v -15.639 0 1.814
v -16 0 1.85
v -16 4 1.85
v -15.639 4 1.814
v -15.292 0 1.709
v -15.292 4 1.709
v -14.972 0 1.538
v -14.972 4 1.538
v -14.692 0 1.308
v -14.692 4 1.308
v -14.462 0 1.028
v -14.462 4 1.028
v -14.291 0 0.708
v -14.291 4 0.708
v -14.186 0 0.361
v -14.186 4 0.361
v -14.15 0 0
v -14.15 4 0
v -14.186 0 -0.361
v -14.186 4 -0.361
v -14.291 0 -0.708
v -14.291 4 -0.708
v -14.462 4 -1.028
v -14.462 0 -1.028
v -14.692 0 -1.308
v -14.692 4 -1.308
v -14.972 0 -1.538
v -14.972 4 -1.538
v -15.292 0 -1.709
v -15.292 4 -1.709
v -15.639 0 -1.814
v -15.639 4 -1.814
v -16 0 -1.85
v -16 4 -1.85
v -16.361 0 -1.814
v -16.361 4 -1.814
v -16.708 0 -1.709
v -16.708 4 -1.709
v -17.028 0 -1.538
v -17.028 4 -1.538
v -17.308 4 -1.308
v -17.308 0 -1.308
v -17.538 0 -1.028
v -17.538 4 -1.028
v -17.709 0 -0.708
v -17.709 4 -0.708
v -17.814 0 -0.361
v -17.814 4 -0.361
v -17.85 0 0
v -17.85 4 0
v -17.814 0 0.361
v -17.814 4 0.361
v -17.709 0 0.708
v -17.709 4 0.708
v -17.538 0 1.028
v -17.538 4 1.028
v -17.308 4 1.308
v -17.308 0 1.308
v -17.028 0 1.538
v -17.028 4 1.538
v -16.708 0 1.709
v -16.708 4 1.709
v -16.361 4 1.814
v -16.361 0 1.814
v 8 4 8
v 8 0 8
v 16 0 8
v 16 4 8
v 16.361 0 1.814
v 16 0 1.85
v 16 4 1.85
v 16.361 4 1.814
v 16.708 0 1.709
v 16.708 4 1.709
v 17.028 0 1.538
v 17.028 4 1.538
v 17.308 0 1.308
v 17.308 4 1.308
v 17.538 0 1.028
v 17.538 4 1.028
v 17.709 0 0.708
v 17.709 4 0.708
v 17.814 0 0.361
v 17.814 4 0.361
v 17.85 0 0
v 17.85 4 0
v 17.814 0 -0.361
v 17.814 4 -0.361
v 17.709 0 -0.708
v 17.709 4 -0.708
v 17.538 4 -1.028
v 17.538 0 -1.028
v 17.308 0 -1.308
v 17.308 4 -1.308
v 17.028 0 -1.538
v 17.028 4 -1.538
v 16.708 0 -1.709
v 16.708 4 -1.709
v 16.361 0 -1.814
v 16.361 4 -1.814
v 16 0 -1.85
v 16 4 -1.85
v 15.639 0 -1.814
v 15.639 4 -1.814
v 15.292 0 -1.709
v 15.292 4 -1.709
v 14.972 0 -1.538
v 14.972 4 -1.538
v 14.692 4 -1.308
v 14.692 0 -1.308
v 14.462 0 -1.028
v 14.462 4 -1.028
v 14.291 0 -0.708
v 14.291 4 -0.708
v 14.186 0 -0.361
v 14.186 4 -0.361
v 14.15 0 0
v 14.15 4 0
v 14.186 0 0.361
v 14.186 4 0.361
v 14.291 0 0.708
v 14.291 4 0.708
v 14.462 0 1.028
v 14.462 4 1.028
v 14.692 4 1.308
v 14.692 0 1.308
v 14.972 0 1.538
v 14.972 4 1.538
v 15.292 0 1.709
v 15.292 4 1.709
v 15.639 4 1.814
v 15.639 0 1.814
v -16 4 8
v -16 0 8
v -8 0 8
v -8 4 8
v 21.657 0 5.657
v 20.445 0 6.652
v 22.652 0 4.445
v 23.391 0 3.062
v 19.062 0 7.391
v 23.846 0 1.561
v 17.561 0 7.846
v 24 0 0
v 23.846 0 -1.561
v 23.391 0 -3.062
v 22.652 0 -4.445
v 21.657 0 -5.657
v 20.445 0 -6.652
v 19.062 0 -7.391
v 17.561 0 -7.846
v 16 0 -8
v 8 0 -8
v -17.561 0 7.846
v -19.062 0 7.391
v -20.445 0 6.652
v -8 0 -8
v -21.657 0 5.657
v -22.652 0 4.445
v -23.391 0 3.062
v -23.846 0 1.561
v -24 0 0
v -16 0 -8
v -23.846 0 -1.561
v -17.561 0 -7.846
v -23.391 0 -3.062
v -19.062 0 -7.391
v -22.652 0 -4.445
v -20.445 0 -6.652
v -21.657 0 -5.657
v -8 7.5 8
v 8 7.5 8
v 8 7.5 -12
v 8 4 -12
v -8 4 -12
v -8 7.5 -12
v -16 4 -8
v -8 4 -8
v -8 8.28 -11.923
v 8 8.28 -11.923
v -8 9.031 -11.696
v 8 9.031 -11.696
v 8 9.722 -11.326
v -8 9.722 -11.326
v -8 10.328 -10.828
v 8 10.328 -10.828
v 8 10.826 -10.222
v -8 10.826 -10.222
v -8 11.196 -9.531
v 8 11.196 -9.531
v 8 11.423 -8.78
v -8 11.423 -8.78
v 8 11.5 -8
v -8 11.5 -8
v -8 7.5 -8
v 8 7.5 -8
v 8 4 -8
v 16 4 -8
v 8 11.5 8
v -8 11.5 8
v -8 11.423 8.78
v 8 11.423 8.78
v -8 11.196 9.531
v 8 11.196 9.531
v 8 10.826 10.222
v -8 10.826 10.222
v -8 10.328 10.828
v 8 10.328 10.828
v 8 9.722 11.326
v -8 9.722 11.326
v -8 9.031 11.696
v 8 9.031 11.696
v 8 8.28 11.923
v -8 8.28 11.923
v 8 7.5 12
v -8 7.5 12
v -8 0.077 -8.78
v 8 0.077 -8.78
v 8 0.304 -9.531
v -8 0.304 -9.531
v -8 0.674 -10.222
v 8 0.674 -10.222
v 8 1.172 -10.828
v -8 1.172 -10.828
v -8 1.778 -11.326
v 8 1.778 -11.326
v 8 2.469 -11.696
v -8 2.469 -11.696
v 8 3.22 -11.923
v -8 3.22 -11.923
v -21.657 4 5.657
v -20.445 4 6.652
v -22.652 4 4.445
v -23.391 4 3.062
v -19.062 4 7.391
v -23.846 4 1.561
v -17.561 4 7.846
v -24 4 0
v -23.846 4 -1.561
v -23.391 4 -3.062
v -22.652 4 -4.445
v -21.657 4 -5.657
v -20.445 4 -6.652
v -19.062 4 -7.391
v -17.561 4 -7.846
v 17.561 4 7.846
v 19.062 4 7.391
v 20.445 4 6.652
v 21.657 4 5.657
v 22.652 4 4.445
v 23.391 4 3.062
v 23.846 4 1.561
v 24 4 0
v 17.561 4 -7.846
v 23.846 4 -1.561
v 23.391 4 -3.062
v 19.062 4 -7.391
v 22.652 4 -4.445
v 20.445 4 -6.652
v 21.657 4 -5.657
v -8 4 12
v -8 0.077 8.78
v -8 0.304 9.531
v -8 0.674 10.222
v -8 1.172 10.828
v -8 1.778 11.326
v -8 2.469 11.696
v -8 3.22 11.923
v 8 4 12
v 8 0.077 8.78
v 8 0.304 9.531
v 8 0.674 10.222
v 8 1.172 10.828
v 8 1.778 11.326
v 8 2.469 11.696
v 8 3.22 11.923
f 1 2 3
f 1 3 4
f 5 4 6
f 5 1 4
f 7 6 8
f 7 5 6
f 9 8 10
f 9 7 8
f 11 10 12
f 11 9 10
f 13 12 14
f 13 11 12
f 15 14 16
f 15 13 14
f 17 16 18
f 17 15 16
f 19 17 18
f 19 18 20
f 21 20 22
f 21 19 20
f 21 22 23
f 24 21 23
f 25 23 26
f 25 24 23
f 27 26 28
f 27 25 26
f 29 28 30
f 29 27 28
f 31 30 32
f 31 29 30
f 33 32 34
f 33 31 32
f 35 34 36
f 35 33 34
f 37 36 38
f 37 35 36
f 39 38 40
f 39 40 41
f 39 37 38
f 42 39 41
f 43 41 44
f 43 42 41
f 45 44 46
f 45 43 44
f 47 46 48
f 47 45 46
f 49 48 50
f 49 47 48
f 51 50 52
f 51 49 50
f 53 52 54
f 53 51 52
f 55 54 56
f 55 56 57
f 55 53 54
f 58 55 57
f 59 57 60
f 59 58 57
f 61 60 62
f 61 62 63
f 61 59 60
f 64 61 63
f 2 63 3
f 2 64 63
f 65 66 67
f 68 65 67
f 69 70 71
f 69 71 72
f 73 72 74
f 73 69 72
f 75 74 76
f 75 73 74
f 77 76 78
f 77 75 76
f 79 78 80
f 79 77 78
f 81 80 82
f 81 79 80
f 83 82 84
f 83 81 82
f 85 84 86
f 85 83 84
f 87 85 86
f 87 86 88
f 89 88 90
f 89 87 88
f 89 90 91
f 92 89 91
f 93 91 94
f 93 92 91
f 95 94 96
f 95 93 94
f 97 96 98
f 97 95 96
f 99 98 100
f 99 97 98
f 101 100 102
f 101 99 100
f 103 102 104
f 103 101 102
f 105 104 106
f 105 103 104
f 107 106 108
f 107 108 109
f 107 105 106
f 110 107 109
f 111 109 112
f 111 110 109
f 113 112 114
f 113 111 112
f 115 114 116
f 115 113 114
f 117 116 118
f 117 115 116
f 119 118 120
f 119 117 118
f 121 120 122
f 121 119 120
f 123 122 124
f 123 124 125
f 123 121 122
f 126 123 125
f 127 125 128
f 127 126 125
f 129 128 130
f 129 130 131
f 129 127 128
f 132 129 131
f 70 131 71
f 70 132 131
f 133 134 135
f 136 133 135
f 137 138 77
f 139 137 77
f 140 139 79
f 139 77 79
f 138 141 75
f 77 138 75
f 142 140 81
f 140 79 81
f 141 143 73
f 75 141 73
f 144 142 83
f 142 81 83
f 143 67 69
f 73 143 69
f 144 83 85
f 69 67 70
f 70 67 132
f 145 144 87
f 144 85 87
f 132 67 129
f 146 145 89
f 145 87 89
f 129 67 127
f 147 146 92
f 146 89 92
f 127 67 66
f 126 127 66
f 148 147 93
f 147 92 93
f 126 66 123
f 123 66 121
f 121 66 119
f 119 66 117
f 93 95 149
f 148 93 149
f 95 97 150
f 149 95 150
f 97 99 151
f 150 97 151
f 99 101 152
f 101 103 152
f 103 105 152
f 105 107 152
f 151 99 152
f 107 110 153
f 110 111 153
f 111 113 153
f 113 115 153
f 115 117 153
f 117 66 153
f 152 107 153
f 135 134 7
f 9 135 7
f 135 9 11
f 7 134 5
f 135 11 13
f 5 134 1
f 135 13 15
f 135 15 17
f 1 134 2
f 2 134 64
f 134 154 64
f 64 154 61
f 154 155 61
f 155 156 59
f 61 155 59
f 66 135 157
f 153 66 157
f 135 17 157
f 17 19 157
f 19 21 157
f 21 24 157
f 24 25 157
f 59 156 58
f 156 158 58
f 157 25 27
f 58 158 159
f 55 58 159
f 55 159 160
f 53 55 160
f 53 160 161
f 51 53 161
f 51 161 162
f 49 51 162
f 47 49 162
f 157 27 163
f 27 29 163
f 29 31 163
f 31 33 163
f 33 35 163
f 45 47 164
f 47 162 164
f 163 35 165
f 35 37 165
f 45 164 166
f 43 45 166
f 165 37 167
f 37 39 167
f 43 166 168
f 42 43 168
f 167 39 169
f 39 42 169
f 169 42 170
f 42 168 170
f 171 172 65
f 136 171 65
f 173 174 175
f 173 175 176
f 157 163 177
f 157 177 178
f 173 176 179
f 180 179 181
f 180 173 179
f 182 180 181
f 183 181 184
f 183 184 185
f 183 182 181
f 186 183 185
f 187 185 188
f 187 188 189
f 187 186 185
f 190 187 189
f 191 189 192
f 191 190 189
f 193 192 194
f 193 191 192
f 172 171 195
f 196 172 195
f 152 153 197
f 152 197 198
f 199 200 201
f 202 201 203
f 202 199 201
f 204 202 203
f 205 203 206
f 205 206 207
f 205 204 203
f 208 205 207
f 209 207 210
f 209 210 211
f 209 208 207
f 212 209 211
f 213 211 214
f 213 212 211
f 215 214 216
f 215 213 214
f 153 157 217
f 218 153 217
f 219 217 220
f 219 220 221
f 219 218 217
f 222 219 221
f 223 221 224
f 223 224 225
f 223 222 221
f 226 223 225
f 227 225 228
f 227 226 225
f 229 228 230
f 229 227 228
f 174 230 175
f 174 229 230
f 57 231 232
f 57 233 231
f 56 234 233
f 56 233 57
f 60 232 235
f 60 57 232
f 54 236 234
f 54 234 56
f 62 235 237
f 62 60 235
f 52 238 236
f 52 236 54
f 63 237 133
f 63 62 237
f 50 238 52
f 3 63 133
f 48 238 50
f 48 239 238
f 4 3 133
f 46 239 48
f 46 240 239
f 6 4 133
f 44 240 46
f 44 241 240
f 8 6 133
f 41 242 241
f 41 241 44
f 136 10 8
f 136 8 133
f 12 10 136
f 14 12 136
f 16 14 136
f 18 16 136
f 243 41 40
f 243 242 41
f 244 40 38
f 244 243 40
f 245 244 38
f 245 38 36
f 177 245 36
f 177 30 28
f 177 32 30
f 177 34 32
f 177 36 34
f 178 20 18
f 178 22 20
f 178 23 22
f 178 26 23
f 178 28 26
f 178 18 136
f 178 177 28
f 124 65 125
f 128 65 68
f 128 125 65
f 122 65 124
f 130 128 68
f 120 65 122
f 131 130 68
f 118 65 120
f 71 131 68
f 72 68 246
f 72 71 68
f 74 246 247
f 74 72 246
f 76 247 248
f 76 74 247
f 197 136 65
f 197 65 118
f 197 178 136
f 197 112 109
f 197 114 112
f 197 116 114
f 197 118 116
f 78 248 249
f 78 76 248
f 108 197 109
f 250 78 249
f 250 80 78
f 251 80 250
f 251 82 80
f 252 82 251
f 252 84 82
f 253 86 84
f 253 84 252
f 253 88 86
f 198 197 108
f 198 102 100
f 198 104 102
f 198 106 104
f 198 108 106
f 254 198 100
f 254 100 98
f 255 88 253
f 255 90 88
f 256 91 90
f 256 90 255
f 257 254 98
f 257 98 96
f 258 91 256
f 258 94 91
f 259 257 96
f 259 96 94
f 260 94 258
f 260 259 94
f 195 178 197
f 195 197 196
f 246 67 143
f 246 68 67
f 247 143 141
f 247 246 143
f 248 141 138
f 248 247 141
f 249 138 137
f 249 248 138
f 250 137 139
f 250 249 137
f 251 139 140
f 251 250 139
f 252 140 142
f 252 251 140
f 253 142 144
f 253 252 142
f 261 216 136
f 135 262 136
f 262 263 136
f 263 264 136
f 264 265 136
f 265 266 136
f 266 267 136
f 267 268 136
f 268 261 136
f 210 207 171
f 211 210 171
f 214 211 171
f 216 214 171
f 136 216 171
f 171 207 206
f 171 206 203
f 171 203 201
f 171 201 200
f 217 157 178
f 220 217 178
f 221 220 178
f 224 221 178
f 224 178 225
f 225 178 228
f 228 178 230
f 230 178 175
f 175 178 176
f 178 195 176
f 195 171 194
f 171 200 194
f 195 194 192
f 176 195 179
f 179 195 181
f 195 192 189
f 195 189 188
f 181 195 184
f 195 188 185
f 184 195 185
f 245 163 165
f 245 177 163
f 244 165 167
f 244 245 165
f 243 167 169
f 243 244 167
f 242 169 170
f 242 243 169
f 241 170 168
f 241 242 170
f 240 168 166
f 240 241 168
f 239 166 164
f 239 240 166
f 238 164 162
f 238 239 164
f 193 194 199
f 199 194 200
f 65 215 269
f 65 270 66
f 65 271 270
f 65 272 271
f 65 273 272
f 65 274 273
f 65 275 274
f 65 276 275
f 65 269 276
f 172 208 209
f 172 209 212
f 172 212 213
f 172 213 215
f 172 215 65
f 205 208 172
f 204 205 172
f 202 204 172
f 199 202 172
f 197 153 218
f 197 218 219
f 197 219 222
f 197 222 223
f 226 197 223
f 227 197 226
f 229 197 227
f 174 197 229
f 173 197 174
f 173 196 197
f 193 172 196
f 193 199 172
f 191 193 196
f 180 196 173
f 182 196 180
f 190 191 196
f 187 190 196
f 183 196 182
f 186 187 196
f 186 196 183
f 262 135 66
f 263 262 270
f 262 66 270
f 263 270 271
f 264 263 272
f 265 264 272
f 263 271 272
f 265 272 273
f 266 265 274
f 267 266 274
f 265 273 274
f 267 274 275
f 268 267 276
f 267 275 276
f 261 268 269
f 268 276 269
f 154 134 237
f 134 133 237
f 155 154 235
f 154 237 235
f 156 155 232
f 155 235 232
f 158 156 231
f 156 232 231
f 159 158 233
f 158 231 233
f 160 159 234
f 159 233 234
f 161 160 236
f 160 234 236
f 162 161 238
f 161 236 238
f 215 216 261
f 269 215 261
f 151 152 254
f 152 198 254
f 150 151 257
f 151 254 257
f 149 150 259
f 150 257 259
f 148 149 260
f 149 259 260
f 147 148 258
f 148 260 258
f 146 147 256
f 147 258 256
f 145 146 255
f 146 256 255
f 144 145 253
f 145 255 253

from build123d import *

# Parameters (mm, degrees)
SKETCH1_W           = 48
SKETCH1_H           = 16
SKETCH1_R           = 1.85
BOSS_EXTRUDE1_DEPTH = 4
BOSS_EXTRUDE2_DEPTH = 16
FILLET1_R           = 4
FILLET2_R           = 8


with BuildPart() as part:
    # Sketch1 → Boss-Extrude1 (new body)
    with BuildSketch(Plane(origin=(0, 0, 0), x_dir=(1, 0, 0), z_dir=(0, 1, 0))):
        Rectangle(SKETCH1_W, SKETCH1_H)
        with Locations(Location((-16, 0, 0), (0, 0, 270))):
            Circle(SKETCH1_R, mode=Mode.SUBTRACT)
        with Locations(Location((16, 0, 0), (0, 0, 270))):
            Circle(SKETCH1_R, mode=Mode.SUBTRACT)
    extrude(amount=BOSS_EXTRUDE1_DEPTH)

    # Sketch2 → Boss-Extrude2 (add)
    with BuildSketch(Plane.ZY.offset(8)):
        Polygon((-8, 4), (-8, 0), (-12, 0), (-12, 11.5), (12, 11.5), (12, 0), (8, 0), (8, 4), (8, 7.5), (-8, 7.5), align=None)
    extrude(amount=-BOSS_EXTRUDE2_DEPTH)

    # Fillet1
    fillet1_edges = [part.edges().sort_by_distance(p)[0] for p in [
        (0, 11.5, 12),
        (0, 0, 12),
        (0, 0, -12),
        (0, 11.5, -12),
    ]]
    fillet(fillet1_edges, radius=FILLET1_R)

    # Fillet2
    fillet2_edges = [part.edges().sort_by_distance(p)[0] for p in [
        (-24, 2, 8),
        (-24, 2, -8),
        (24, 2, 8),
        (24, 2, -8),
    ]]
    fillet(fillet2_edges, radius=FILLET2_R - 0.0001)  # a hair under: the kernel refuses the full size


solid = part.part
